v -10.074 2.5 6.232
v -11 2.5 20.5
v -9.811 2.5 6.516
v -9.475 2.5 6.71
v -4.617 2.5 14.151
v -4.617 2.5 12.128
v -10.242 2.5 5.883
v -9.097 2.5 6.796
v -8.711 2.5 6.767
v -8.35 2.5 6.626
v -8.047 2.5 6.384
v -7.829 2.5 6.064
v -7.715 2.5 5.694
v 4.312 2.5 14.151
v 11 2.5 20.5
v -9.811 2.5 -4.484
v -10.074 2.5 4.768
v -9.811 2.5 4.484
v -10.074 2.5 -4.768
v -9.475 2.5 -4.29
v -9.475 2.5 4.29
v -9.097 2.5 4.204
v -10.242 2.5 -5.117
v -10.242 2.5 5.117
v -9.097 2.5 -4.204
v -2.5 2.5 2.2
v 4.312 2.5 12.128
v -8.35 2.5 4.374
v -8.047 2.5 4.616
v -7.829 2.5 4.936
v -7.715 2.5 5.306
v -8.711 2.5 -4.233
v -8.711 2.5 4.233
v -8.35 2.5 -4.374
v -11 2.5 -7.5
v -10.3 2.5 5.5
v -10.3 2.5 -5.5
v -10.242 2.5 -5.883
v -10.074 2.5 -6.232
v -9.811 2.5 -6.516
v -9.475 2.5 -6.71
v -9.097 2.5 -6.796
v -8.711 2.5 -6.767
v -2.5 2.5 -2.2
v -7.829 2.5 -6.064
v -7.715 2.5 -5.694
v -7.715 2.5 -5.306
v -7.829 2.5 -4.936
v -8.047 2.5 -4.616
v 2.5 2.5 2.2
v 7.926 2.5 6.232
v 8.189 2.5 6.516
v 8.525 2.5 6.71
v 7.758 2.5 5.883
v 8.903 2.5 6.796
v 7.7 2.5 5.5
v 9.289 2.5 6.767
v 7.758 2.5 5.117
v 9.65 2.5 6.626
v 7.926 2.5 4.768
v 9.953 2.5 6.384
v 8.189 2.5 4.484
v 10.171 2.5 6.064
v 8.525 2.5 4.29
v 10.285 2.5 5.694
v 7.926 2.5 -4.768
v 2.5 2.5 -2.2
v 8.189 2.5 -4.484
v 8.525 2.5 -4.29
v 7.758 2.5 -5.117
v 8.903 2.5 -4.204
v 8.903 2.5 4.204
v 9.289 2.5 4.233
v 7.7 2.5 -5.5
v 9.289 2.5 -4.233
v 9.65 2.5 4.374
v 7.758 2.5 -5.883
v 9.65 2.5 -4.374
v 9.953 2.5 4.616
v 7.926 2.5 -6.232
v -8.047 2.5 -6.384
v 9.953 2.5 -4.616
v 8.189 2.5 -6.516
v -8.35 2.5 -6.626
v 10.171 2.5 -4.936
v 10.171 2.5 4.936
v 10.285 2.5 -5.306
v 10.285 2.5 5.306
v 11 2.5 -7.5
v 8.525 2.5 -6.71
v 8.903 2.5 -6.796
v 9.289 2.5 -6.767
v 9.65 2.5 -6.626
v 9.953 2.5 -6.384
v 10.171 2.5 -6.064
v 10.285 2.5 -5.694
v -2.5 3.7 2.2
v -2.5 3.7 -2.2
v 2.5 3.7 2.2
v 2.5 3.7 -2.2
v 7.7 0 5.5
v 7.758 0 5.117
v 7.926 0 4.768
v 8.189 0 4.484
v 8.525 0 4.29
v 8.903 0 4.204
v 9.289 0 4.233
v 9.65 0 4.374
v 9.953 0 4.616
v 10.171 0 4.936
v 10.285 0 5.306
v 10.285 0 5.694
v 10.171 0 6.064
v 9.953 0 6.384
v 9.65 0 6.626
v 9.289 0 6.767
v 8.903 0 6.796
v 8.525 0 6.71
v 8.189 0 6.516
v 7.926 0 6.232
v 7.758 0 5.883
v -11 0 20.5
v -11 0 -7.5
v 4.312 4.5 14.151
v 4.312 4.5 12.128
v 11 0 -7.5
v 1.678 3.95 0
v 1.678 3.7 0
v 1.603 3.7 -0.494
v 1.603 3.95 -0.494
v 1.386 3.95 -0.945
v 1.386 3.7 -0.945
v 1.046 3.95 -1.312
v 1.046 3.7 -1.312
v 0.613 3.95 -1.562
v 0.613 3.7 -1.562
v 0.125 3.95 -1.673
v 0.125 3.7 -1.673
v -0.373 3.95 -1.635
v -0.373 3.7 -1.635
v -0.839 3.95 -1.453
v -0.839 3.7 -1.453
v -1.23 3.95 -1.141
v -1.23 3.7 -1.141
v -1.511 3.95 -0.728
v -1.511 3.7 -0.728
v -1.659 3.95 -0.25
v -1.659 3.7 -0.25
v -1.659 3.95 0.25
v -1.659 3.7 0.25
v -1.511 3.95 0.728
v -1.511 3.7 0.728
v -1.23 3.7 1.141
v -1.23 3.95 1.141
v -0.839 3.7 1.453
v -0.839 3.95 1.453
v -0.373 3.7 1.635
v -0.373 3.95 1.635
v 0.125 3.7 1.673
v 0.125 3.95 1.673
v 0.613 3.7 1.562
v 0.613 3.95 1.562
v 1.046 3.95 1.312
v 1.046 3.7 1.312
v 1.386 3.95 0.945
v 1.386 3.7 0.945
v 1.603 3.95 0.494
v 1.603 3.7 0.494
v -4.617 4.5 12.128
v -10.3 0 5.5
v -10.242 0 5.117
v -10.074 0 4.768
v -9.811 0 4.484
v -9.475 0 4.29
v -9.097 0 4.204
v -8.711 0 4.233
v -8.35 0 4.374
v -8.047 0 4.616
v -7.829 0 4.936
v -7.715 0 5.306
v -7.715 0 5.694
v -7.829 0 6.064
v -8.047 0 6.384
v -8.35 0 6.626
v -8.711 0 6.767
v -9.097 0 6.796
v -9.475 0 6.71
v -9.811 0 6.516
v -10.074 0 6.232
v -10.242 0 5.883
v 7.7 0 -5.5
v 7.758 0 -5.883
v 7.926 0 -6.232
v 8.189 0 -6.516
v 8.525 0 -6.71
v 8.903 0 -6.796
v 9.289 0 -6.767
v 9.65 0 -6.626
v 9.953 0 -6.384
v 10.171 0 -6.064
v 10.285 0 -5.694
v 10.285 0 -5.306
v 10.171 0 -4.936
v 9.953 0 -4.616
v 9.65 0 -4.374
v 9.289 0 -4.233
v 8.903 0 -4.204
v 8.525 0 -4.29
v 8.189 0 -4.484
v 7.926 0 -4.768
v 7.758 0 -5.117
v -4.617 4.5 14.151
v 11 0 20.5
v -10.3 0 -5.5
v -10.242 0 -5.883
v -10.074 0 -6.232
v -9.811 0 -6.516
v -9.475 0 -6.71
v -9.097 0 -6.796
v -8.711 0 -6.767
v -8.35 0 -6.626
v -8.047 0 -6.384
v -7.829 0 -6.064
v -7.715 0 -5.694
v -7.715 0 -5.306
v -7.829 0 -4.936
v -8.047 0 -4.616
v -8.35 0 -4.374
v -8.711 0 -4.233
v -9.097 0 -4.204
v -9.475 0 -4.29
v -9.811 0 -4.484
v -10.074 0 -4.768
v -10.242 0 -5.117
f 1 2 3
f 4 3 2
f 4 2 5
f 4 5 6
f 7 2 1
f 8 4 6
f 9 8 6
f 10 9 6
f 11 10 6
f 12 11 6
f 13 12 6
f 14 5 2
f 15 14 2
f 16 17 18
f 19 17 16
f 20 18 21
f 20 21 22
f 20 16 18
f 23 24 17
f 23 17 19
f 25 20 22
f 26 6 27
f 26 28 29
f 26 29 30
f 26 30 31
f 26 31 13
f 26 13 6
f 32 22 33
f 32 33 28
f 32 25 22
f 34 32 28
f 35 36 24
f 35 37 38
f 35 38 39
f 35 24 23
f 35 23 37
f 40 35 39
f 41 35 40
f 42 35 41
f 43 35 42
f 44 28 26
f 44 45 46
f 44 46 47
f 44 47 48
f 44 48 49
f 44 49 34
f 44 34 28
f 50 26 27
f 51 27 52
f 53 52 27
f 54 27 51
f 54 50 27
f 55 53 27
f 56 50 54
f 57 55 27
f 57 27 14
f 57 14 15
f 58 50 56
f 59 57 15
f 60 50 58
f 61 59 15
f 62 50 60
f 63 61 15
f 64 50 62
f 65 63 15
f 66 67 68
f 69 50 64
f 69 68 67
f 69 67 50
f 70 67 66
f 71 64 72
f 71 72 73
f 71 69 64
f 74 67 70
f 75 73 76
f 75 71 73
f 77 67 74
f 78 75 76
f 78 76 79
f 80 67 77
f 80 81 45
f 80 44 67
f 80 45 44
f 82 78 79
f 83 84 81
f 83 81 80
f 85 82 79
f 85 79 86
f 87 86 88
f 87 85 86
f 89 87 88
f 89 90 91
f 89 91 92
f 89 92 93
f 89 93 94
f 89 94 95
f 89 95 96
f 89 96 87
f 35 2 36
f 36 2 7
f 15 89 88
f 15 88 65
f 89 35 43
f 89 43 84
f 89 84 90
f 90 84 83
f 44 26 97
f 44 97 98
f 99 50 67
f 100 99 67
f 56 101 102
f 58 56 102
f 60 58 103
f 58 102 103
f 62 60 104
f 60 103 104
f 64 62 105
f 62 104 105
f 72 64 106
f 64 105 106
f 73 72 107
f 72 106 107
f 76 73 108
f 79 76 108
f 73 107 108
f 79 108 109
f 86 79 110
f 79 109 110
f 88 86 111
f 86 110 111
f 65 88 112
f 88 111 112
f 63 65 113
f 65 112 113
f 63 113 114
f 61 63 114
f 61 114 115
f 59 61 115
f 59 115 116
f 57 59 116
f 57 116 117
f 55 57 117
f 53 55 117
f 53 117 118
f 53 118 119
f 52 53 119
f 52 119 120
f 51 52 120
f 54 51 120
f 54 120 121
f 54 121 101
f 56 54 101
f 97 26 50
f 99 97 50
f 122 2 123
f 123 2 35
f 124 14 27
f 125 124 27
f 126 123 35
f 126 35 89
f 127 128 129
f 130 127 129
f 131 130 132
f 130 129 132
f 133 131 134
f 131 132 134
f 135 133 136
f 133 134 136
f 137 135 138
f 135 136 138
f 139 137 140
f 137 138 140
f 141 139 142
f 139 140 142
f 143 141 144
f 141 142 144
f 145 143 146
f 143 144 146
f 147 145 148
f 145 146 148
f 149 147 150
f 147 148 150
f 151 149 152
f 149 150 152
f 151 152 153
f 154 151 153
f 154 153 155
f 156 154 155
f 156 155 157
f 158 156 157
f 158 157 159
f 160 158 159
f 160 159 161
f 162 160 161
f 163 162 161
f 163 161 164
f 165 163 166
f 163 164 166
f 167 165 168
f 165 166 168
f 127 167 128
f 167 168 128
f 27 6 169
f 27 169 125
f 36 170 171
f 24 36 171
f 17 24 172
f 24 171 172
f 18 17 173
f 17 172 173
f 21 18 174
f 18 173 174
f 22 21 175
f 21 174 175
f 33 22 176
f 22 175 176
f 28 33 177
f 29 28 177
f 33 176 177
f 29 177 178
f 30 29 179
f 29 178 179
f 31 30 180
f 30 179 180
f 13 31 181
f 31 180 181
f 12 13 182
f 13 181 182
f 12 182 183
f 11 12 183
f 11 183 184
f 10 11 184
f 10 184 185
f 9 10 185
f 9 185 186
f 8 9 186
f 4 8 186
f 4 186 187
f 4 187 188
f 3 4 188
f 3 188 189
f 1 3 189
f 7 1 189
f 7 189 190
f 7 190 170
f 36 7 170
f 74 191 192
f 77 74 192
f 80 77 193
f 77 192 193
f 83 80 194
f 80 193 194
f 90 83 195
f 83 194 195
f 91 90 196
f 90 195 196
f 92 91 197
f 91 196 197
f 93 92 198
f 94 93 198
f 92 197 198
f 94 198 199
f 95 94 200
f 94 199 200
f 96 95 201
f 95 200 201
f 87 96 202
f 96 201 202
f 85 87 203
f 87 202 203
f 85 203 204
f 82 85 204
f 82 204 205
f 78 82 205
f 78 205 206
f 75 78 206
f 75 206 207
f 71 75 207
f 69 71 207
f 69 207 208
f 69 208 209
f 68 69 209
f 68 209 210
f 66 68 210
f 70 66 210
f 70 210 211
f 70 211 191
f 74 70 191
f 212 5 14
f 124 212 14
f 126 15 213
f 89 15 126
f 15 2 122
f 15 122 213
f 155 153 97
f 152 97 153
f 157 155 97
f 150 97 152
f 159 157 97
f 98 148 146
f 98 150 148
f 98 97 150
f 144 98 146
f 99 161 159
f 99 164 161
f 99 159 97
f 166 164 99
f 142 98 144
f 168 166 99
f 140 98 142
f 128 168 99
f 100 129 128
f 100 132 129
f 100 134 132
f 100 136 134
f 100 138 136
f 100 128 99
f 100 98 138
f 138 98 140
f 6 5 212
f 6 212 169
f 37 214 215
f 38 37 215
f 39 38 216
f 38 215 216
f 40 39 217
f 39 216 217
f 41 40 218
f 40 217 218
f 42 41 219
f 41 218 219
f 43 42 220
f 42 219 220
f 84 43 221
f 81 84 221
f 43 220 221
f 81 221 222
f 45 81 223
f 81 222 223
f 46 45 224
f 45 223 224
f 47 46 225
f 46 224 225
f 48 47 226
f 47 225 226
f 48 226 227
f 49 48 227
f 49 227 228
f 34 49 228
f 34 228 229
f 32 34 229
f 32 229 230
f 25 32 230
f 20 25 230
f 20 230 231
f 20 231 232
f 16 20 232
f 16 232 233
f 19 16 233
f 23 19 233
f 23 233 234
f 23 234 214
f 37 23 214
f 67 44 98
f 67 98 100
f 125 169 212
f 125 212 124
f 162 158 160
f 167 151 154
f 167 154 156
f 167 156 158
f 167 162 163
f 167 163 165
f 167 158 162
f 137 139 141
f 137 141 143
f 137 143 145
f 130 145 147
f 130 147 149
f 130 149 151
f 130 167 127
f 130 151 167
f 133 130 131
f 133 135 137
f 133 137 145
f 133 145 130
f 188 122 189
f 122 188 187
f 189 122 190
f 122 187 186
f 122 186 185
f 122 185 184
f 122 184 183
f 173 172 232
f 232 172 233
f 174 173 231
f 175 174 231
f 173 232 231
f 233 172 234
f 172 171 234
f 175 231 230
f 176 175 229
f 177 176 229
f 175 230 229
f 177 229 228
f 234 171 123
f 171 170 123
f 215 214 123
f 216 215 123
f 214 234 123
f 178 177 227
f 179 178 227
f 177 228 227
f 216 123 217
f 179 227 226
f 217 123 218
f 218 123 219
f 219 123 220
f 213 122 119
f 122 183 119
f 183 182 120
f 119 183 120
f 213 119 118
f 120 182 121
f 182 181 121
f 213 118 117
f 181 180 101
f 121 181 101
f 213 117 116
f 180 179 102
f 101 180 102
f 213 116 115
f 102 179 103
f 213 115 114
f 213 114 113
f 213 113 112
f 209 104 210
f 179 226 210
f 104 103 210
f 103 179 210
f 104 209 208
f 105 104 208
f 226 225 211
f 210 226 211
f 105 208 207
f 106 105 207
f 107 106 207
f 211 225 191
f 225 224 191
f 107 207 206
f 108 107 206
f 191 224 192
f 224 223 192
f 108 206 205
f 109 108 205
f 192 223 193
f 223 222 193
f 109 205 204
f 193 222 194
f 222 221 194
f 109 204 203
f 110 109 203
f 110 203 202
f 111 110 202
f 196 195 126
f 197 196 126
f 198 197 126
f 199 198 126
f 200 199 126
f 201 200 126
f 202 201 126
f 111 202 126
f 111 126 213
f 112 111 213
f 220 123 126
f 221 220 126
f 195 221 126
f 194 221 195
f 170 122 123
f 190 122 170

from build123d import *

# Parameters (mm, degrees)
SKETCH1_W                 = 22
SKETCH1_H                 = 15
BOSS_EXTRUDE1_DEPTH       = 2.5
F_1_0MM_DOWEL_HOLE1_D     = 2.6
F_1_0MM_DOWEL_HOLE1_DEPTH = 6.35
F_1_0MM_DOWEL_HOLE1_TIP   = 0.781118805
SKETCH4_W                 = 5
SKETCH4_H                 = 4.4
BOSS_EXTRUDE2_DEPTH       = 1.2
SKETCH5_W                 = 22
SKETCH5_H                 = 13
BOSS_EXTRUDE3_DEPTH       = 2.5
SKETCH6_W                 = 8.928834932
SKETCH6_H                 = 2.022342955
BOSS_EXTRUDE4_DEPTH       = 2
SKETCH7_R                 = 1.677550445
BOSS_EXTRUDE5_DEPTH       = 0.25


with BuildPart() as part:
    # Sketch1 → Boss-Extrude1 (new body)
    with BuildSketch(Plane(origin=(0, 0, 0), x_dir=(1, 0, 0), z_dir=(0, 1, 0))):
        Rectangle(SKETCH1_W, SKETCH1_H)
    extrude(amount=BOSS_EXTRUDE1_DEPTH)

    # Ø1.0mm Dowel Hole1
    with Locations(Plane(origin=(0, 2.5, 0), x_dir=(1, 0, 0), z_dir=(0, 1, 0))):
        with Locations((-9, 5.5), (9, 5.5), (9, -5.5), (-9, -5.5)):
            Hole(F_1_0MM_DOWEL_HOLE1_D / 2, depth=F_1_0MM_DOWEL_HOLE1_DEPTH)
            with Locations((0, 0, -(F_1_0MM_DOWEL_HOLE1_DEPTH + F_1_0MM_DOWEL_HOLE1_TIP / 2))):  # 118° drill point
                Cone(0, F_1_0MM_DOWEL_HOLE1_D / 2, F_1_0MM_DOWEL_HOLE1_TIP, mode=Mode.SUBTRACT)

    # Sketch4 → Boss-Extrude2 (add)
    with BuildSketch(Plane(origin=(0, 2.5, 0), x_dir=(1, 0, 0), z_dir=(0, 1, 0))):
        Rectangle(SKETCH4_W, SKETCH4_H)
    extrude(amount=BOSS_EXTRUDE2_DEPTH)

    # Sketch5 → Boss-Extrude3 (add)
    with BuildSketch(Plane(origin=(0, 2.5, 0), x_dir=(1, 0, 0), z_dir=(0, 1, 0))):
        with Locations((0, -14)):
            Rectangle(SKETCH5_W, SKETCH5_H)
    extrude(amount=-BOSS_EXTRUDE3_DEPTH)

    # Sketch6 → Boss-Extrude4 (add)
    with BuildSketch(Plane(origin=(0, 2.5, 0), x_dir=(1, 0, 0), z_dir=(0, 1, 0))):
        with Locations((-0.152629657, -13.139390077)):
            Rectangle(SKETCH6_W, SKETCH6_H)
    extrude(amount=BOSS_EXTRUDE4_DEPTH)

    # Sketch7 → Boss-Extrude5 (add)
    with BuildSketch(Plane(origin=(0, 3.7, 0), x_dir=(1, 0, 0), z_dir=(0, 1, 0))):
        Circle(SKETCH7_R)
    extrude(amount=BOSS_EXTRUDE5_DEPTH)


solid = part.part
